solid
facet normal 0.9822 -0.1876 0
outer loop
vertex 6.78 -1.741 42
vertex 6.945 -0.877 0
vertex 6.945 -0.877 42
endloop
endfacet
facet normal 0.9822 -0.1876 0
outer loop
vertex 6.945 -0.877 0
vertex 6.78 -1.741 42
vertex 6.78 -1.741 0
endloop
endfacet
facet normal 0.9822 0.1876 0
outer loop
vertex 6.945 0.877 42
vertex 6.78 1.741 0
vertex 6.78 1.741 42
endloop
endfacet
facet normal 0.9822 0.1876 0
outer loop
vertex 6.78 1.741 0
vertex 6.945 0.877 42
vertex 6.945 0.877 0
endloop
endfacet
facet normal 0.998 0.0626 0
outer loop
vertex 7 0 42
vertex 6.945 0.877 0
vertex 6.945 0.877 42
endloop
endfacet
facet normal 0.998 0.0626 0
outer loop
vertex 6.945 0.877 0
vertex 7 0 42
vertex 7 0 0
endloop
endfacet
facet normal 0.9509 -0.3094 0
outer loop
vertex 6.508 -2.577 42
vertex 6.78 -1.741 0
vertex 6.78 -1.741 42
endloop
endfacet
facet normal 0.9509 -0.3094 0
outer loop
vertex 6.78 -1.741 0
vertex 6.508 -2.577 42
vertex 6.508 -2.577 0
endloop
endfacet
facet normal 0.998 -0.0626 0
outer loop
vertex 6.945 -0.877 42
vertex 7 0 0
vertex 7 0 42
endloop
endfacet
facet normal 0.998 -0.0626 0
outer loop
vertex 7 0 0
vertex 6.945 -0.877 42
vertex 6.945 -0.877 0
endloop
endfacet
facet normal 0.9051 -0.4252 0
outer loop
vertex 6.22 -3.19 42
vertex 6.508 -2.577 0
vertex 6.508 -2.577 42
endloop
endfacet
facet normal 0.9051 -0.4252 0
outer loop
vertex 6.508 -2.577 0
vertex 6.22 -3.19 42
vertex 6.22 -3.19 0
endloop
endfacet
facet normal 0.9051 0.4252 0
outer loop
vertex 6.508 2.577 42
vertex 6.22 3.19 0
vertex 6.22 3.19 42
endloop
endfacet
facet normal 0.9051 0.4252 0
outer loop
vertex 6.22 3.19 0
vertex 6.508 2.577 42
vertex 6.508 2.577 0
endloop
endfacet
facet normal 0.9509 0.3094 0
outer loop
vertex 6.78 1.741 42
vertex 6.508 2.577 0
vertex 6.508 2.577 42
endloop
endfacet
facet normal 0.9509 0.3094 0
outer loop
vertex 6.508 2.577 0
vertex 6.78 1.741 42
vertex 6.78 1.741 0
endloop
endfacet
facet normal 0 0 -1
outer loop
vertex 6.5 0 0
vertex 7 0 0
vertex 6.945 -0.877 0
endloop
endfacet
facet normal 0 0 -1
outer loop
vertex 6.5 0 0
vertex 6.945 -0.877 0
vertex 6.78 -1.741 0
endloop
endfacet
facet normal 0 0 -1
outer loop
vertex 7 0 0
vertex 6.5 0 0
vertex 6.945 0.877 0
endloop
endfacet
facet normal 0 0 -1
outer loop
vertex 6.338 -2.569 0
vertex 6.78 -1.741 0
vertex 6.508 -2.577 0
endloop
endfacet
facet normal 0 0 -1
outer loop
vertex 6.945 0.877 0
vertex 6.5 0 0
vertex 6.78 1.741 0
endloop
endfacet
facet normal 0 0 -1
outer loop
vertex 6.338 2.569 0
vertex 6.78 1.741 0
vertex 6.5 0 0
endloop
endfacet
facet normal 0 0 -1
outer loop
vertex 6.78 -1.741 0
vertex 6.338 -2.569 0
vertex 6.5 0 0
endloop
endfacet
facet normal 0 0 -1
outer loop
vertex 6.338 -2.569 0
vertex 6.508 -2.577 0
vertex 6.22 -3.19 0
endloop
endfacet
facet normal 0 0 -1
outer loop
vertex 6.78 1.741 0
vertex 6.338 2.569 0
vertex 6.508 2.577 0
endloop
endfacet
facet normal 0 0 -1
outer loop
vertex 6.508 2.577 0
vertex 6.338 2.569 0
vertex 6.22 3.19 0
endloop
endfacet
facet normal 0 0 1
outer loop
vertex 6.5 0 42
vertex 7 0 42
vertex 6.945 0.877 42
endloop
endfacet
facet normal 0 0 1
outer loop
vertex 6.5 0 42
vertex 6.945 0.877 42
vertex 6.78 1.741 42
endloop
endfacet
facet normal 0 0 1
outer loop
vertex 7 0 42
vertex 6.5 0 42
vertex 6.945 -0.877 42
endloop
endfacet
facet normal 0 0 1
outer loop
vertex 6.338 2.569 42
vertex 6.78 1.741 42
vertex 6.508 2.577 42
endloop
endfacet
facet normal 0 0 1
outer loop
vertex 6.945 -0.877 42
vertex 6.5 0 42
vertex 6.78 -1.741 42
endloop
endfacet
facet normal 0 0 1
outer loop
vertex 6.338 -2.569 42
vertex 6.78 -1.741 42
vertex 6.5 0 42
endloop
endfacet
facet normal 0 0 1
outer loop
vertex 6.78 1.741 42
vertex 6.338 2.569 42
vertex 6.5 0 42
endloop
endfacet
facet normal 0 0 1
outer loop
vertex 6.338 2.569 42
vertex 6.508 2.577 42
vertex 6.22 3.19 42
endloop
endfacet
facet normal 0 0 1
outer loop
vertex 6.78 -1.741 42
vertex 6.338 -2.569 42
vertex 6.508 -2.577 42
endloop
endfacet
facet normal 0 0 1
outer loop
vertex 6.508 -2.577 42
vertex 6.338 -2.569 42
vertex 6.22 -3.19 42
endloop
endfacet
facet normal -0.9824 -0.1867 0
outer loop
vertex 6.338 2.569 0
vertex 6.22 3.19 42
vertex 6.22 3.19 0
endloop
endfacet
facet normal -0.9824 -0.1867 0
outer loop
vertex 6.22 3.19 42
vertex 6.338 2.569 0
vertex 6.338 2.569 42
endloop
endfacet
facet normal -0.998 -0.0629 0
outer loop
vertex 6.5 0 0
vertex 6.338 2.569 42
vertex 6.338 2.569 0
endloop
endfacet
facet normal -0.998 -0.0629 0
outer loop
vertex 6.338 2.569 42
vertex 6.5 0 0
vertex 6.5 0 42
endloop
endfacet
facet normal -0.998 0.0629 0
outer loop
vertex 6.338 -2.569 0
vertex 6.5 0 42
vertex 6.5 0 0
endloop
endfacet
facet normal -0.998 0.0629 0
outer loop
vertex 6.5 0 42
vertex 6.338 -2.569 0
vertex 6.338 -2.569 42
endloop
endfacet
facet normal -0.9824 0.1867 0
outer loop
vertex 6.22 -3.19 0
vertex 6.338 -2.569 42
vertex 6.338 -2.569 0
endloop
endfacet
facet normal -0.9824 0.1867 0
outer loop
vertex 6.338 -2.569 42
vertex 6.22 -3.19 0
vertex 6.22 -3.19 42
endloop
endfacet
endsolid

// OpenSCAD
$fn = 50;


difference() {
	union() {
		cylinder(h = 42, r = 7.0000000000);
		translate(v = [-17.0000000000, 0, 0]) {
			cylinder(h = 42, r = 7.0000000000);
		}
	}
	union() {
		cylinder(h = 42, r = 3.2500000000);
		cylinder(h = 42, r = 1.8000000000);
		cylinder(h = 42, r = 1.8000000000);
		cylinder(h = 42, r = 1.8000000000);
		translate(v = [-21.5000000000, 0, 0]) {
			hull() {
				translate(v = [-3.7500000000, 0.0000000000, 0]) {
					cylinder(h = 42, r = 10.5000000000);
				}
				translate(v = [3.7500000000, 0.0000000000, 0]) {
					cylinder(h = 42, r = 10.5000000000);
				}
				translate(v = [-3.7500000000, -0.0000000000, 0]) {
					cylinder(h = 42, r = 10.5000000000);
				}
				translate(v = [3.7500000000, -0.0000000000, 0]) {
					cylinder(h = 42, r = 10.5000000000);
				}
			}
		}
		translate(v = [-14.0000000000, 0, 0.0000000000]) {
			cylinder(h = 42, r = 20.5000000000);
		}
	}
}
